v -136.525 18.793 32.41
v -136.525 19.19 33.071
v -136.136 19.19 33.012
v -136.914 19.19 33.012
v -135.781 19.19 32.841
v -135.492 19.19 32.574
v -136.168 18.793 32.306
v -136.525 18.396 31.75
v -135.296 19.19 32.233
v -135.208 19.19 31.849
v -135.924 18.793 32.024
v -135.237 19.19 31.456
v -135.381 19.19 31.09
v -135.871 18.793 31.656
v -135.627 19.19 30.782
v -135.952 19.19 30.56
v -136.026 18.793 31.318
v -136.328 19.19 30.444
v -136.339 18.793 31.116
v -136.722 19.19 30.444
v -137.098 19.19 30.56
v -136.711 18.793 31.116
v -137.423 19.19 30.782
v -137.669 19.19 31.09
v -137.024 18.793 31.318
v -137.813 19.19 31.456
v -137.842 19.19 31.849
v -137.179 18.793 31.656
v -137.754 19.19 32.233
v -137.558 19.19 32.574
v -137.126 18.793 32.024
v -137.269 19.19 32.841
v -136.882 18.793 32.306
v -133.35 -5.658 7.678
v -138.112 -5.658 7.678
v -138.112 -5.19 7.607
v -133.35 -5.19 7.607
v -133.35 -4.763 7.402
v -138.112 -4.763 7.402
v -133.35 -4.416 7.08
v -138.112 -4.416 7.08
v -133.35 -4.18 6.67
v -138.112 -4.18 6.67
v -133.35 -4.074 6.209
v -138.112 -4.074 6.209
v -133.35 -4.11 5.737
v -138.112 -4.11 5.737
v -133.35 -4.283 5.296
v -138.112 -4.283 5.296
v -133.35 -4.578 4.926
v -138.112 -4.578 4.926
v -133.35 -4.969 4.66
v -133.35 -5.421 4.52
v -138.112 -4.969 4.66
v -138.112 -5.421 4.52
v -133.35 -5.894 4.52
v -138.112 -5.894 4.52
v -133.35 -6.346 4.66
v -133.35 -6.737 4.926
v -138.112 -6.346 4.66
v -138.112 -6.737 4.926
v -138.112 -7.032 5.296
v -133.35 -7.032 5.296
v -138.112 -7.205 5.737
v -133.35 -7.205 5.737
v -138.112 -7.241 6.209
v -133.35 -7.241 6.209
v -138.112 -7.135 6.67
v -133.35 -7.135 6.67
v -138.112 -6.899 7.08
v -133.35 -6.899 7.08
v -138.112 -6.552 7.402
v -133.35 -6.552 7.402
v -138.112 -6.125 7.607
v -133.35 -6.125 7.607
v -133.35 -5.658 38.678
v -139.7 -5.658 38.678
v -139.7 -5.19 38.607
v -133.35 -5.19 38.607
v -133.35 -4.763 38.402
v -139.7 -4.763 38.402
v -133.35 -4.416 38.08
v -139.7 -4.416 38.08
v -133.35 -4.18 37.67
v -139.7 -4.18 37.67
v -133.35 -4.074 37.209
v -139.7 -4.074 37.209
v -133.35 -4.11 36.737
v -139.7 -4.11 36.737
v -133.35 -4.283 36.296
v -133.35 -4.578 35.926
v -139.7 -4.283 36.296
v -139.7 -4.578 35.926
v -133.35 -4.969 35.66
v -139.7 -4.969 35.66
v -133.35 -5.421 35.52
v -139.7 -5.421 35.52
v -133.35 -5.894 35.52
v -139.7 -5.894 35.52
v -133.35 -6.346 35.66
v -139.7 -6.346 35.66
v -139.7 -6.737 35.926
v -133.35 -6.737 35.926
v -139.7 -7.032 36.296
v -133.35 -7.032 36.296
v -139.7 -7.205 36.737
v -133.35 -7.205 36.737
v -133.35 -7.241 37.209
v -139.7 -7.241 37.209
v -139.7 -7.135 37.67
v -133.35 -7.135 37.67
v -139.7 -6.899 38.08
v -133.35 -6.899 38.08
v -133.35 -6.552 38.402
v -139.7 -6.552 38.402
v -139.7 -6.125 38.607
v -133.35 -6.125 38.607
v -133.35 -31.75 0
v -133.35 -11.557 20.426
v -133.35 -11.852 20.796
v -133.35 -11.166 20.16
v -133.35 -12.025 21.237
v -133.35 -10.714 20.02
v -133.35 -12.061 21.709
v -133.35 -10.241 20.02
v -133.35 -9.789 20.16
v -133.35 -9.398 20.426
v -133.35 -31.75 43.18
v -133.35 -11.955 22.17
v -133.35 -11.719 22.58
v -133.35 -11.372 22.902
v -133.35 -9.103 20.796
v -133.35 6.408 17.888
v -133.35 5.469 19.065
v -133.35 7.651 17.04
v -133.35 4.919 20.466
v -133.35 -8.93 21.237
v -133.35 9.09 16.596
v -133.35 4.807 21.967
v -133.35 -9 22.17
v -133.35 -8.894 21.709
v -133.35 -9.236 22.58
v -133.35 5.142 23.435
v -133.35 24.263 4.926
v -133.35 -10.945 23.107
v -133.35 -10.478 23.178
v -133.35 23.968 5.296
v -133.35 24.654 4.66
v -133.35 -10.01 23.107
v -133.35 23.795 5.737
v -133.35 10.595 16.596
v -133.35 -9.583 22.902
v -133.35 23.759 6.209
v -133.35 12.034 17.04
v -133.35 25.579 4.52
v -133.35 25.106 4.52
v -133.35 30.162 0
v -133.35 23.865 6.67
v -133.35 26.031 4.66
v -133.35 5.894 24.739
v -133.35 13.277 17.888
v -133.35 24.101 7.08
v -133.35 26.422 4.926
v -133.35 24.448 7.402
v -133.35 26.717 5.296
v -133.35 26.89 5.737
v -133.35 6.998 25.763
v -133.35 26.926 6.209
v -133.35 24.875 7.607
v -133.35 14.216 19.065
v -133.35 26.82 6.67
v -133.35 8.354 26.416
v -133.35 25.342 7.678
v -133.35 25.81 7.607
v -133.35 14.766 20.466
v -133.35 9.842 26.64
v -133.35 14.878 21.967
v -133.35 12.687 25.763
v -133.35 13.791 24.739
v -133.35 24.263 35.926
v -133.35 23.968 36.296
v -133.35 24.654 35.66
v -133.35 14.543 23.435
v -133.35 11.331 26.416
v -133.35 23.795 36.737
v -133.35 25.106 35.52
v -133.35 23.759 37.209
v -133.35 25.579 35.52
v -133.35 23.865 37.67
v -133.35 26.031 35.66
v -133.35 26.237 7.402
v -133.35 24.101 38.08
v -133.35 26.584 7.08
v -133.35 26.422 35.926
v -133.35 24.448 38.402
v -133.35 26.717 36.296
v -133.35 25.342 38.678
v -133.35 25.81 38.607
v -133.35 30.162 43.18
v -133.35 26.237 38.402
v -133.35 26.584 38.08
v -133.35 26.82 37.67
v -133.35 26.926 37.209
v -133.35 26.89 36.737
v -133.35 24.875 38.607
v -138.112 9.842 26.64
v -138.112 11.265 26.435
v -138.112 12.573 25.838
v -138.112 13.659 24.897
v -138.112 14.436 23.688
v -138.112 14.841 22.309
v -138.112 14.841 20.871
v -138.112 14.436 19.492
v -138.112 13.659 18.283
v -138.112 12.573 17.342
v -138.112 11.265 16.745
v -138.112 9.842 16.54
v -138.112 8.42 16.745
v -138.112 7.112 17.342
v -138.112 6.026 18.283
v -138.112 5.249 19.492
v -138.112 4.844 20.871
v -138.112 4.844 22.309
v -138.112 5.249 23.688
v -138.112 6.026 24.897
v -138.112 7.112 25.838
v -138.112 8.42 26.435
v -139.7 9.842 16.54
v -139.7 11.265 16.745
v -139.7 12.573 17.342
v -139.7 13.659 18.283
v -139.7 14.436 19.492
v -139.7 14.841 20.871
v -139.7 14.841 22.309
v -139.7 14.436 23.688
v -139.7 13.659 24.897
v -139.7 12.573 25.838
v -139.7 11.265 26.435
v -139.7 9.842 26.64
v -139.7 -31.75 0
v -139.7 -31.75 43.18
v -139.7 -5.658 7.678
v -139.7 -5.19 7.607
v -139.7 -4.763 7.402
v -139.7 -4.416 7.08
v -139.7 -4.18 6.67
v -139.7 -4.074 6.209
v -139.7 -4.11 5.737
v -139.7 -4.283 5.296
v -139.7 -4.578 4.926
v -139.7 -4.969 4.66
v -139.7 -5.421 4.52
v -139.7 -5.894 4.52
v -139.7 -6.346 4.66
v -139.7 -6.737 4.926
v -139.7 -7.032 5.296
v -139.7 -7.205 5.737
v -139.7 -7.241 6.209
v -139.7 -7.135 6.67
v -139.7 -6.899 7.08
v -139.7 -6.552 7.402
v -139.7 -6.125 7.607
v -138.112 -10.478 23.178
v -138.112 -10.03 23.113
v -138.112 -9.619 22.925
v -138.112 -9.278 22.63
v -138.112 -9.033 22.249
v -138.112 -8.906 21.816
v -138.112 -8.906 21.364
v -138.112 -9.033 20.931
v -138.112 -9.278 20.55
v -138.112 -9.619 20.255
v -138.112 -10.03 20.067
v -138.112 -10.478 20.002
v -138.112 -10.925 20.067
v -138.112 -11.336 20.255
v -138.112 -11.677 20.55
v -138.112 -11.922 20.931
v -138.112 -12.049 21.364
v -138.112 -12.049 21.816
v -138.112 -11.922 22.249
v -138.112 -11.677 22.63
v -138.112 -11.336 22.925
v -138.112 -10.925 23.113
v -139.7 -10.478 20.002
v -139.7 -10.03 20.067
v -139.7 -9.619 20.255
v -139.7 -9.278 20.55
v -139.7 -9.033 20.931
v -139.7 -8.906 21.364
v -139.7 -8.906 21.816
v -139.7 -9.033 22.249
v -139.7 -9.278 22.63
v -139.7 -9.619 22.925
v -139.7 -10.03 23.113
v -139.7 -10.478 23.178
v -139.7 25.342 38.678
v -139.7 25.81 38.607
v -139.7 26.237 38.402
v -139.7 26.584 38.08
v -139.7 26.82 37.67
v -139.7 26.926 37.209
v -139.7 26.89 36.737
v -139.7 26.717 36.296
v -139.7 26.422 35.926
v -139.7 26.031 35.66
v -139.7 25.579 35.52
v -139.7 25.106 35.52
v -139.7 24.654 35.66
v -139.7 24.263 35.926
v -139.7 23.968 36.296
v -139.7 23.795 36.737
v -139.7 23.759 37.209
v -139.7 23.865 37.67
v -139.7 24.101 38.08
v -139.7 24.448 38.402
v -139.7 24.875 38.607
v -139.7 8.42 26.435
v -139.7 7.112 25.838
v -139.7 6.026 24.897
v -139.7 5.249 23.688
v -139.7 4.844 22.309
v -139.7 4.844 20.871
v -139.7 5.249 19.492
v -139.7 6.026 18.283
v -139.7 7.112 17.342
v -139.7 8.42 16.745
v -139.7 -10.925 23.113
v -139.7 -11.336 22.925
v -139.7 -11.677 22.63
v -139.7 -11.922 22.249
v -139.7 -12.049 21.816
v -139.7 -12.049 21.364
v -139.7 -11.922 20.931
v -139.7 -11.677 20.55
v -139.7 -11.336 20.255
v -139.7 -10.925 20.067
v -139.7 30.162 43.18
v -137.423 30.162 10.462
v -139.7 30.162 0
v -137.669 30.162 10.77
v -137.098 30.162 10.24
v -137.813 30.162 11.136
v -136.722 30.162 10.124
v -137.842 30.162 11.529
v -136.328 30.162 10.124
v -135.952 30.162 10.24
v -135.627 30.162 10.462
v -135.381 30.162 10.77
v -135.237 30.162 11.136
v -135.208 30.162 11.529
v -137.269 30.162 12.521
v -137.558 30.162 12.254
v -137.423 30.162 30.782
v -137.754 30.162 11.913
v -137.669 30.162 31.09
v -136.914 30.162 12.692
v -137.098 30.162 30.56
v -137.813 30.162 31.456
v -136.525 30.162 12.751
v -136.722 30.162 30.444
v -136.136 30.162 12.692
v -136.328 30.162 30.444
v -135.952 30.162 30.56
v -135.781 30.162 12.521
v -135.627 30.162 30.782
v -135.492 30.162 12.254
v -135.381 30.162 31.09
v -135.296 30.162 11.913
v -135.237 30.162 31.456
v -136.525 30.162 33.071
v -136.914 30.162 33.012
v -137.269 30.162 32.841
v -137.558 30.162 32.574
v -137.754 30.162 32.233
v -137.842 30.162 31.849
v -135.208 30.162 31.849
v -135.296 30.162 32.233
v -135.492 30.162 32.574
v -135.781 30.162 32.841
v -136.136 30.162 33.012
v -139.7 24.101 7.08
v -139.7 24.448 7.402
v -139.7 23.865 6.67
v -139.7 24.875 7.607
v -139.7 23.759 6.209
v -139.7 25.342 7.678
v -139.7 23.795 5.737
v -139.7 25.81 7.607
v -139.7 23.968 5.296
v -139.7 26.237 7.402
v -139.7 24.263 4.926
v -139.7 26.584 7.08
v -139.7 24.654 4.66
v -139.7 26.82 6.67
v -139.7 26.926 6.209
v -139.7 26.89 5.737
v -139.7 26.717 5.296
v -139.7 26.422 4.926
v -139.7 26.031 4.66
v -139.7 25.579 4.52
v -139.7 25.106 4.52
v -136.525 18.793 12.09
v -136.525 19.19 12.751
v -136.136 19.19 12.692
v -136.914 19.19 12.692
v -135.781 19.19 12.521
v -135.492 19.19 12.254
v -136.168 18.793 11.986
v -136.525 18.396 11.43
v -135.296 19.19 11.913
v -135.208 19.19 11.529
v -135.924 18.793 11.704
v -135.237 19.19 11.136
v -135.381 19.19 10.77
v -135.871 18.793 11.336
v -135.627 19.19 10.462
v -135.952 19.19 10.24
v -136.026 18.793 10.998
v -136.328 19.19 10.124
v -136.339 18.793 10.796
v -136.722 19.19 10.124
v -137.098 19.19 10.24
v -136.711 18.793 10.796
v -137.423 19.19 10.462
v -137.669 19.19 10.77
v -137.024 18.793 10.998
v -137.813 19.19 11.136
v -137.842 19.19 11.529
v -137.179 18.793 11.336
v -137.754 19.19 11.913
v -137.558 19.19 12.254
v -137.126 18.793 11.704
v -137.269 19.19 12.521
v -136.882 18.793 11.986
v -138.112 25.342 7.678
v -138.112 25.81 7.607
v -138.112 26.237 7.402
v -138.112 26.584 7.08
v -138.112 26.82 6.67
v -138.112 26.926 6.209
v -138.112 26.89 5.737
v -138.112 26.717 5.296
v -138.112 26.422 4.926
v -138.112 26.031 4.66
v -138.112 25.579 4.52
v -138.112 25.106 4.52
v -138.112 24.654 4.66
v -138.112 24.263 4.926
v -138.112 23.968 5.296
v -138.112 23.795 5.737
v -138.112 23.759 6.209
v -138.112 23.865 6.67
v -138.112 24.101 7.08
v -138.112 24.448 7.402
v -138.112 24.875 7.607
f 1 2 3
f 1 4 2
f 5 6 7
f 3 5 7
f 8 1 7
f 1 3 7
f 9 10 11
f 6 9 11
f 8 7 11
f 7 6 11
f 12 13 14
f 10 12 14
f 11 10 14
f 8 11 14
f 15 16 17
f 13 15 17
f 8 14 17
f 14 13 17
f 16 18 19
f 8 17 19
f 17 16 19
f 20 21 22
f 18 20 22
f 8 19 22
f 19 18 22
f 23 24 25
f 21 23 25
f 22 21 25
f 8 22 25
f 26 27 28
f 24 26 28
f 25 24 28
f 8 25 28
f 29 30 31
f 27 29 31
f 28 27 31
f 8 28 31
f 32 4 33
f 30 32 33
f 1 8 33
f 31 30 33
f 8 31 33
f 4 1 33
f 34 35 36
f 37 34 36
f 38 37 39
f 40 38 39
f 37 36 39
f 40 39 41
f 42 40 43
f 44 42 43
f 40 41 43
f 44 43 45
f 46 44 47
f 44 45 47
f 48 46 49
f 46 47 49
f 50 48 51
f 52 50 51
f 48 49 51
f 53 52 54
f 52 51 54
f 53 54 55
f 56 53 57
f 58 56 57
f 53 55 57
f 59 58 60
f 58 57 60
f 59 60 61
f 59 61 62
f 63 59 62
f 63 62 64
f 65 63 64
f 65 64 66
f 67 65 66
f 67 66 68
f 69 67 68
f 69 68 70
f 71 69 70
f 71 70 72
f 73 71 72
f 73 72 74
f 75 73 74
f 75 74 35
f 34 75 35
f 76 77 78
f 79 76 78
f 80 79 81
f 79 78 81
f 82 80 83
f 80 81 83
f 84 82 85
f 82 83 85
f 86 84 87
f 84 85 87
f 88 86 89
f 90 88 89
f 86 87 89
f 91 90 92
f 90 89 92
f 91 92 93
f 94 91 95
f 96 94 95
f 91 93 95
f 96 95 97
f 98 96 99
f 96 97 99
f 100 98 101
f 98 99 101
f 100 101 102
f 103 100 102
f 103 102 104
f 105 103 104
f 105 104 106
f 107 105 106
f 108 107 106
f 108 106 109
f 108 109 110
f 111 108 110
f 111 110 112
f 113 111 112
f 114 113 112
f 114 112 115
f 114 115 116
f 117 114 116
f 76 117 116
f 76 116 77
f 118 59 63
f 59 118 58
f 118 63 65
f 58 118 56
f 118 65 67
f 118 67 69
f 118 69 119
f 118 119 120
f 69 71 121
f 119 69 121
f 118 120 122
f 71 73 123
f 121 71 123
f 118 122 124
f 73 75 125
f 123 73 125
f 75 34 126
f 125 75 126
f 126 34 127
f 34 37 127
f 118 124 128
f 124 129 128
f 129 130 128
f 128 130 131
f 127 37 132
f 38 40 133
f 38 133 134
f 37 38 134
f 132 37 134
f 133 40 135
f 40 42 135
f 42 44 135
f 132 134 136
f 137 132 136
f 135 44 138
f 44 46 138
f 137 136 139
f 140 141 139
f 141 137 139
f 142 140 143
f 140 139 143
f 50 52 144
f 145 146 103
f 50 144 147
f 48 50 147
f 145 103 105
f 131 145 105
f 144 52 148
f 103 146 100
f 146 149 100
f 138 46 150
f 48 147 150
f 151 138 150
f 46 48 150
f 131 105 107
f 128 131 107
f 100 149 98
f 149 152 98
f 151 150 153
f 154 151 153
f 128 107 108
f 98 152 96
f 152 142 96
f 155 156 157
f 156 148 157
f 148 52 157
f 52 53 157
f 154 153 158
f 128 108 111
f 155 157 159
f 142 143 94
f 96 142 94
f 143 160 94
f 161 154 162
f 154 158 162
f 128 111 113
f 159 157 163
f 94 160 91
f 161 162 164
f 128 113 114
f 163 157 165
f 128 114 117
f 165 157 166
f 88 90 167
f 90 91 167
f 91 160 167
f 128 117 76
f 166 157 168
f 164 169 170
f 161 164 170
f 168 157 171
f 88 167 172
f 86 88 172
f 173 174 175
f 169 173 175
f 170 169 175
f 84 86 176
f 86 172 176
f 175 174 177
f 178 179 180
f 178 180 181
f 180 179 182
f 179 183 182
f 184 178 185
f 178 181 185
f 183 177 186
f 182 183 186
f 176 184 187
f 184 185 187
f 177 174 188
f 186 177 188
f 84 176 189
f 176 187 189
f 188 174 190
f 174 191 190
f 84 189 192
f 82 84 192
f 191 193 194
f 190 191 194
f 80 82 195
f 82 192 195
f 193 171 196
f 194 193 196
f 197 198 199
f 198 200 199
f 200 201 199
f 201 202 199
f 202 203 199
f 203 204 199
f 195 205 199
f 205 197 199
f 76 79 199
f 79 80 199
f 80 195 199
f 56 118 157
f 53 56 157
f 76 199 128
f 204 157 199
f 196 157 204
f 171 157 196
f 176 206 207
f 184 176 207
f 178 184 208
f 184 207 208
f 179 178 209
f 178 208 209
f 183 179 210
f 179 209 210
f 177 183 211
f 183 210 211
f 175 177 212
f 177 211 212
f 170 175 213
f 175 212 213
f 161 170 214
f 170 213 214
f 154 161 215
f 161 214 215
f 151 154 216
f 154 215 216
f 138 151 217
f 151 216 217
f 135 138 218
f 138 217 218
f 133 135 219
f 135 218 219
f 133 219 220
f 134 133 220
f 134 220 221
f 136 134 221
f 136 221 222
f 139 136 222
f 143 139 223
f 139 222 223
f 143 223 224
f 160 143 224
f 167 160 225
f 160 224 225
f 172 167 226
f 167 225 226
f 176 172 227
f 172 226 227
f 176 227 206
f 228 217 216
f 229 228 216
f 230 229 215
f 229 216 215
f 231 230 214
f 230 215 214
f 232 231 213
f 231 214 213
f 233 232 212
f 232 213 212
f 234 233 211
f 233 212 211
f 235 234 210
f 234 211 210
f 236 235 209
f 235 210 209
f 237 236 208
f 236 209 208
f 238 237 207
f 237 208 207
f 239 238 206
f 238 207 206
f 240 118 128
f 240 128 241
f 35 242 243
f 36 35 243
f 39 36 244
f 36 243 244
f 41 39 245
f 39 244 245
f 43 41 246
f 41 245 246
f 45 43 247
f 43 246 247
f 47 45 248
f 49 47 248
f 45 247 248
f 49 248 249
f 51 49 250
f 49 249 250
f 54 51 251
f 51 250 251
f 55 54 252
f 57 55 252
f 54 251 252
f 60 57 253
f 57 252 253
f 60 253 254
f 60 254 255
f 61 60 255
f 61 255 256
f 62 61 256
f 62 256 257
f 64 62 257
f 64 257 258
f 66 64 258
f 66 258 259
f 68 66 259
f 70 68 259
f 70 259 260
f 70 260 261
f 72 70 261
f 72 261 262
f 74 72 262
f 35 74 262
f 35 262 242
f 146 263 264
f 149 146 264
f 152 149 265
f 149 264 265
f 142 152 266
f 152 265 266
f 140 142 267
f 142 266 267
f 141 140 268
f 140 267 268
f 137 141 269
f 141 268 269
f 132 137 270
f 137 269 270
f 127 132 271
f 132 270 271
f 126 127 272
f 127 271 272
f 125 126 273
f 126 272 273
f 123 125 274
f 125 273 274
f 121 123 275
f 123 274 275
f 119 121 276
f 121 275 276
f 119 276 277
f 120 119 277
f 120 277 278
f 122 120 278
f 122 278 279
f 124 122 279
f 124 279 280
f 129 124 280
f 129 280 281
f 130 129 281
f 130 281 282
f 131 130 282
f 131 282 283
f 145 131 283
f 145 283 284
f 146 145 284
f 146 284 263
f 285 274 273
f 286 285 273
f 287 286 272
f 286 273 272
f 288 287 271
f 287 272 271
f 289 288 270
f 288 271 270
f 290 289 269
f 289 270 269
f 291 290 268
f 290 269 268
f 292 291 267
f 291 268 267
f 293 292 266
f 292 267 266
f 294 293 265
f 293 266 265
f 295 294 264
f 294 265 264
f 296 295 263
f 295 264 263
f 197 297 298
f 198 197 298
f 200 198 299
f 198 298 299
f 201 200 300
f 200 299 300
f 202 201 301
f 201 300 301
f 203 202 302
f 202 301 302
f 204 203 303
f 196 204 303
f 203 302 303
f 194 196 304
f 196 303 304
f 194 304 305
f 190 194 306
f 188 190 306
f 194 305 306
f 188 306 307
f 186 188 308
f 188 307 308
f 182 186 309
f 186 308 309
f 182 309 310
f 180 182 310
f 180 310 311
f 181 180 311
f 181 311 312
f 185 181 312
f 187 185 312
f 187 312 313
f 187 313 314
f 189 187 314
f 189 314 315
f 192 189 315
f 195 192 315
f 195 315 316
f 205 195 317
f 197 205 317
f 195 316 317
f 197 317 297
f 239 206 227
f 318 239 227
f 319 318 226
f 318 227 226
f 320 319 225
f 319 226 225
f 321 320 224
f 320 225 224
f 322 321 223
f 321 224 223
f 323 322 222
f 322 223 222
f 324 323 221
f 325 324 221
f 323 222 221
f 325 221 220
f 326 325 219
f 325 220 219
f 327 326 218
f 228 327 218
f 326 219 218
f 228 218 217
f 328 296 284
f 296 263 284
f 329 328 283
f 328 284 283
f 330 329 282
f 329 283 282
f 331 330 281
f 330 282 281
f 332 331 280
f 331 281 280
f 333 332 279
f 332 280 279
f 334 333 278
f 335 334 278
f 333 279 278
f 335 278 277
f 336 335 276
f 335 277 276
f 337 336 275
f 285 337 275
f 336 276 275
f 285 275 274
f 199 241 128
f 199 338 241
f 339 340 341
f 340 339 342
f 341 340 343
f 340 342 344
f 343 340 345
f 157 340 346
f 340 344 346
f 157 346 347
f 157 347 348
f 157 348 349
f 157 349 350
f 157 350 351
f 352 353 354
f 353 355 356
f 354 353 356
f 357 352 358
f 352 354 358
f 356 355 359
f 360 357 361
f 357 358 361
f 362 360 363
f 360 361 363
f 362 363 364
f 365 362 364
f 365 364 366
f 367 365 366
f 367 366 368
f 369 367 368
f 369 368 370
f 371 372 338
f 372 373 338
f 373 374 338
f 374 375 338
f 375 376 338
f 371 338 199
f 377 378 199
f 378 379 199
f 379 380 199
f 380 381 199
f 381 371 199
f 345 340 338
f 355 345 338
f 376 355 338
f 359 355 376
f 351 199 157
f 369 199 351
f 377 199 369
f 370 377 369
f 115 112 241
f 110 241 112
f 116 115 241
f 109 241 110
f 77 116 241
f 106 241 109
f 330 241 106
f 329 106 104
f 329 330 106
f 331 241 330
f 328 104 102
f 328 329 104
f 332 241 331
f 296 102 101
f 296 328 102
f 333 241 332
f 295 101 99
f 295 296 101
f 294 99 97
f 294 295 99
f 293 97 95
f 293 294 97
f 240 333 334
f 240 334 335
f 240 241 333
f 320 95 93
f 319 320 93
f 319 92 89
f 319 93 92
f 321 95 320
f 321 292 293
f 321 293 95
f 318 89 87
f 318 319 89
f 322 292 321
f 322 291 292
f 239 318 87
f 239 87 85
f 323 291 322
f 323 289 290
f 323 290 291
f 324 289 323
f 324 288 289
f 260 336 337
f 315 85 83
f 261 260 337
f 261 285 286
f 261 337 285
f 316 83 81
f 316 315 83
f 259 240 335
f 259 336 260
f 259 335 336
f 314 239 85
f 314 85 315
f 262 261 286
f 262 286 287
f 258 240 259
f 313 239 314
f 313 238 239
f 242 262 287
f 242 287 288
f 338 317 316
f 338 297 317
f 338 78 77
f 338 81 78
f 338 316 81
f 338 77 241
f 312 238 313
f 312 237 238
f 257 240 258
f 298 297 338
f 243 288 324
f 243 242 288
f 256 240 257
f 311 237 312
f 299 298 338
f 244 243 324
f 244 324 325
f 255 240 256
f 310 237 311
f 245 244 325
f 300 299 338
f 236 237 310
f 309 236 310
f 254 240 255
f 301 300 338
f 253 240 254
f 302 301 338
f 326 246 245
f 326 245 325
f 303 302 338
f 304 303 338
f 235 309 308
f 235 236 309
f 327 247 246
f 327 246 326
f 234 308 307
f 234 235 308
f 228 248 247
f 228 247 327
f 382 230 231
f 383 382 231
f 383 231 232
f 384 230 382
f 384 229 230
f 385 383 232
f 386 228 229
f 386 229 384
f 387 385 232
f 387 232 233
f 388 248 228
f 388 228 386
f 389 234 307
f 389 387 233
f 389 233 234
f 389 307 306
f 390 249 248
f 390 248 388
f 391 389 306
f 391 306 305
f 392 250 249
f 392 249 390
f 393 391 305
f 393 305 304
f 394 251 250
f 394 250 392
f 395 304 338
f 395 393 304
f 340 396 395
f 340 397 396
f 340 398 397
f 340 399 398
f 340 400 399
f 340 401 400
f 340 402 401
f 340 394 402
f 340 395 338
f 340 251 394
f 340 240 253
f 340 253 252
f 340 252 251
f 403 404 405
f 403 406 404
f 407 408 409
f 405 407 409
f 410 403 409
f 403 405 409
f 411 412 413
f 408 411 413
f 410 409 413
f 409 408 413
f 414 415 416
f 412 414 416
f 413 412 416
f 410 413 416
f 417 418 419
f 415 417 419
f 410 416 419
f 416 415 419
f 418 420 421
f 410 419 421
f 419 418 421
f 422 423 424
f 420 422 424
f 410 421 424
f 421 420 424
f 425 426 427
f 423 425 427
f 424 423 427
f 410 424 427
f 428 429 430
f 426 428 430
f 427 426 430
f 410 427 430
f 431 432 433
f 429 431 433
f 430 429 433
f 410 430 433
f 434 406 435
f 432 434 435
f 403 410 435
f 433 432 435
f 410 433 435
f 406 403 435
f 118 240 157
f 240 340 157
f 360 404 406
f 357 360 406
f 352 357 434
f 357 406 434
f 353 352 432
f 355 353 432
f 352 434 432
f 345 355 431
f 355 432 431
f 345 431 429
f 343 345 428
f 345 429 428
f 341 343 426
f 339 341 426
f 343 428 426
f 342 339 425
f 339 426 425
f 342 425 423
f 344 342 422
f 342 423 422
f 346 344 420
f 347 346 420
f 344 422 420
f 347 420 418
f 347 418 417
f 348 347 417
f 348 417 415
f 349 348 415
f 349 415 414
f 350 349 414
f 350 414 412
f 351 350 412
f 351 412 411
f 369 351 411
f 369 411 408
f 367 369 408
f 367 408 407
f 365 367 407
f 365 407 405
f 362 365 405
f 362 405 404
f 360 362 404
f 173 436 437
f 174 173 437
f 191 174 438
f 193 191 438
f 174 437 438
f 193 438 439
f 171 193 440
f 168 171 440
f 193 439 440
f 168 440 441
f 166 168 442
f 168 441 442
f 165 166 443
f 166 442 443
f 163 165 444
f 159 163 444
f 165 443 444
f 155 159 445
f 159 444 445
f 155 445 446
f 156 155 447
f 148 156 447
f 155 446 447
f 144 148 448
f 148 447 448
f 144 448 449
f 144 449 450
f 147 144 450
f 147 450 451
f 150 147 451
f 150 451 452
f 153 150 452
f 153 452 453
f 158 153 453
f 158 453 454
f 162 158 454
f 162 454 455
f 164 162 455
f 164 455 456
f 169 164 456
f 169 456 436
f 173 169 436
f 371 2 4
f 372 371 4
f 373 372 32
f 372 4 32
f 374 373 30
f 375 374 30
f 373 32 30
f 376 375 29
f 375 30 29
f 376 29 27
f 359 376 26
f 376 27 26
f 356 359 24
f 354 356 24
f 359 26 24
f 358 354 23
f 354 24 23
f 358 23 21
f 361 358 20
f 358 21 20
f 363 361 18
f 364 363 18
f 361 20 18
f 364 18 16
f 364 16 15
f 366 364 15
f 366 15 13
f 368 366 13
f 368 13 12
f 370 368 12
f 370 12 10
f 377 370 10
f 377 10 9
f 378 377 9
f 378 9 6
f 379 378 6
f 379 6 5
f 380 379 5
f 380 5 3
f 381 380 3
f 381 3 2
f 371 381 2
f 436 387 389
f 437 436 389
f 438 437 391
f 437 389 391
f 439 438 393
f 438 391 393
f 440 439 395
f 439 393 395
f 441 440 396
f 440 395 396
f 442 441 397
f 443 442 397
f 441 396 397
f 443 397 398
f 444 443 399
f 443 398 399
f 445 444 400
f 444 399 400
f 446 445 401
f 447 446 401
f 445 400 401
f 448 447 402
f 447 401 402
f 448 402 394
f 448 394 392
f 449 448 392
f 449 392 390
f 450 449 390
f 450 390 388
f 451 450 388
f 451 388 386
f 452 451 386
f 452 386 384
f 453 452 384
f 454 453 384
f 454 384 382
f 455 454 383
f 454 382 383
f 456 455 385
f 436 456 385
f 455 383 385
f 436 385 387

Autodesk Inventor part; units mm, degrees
ref_plane "YZ Plane" through (0, 0, 0) normal (1, 0, 0) x (0, 1, 0)
ref_plane "XZ Plane" through (0, 0, 0) normal (0, 1, 0) x (-1, 0, 0)
ref_plane "XY Plane" through (0, 0, 0) normal (0, 0, 1) x (1, 0, 0)
sketch "Sketch1" plane through (0, 0, 0) normal (0, 0, 1) x (1, 0, 0)
  line L0 (-139.7, 31.75) -> (139.7, 31.75)
  line L1 (139.7, 31.75) -> (139.7, -31.75)
  line L2 (139.7, -31.75) -> (-139.7, -31.75)
  line L3 (-139.7, -31.75) -> (-139.7, 31.75)
  point P0 (0, 0)
  point P1 (0, 31.75)
  point P2 (139.7, 0)
  dimension "d0" = 279.4
  dimension "d1" = 63.5
extrude "Extrusion1" add sketch "Sketch1" along normal blind 43.18
sketch "Sketch2" plane through (0, 0, 43.18) normal (0, 0, 1) x (1, 0, 0)
  line L0 (-139.7, -31.75) -> (139.7, -31.75) projected
  line L1 (-138.1125, 30.1625) -> (138.1125, 30.1625)
  line L2 (138.1125, 30.1625) -> (138.1125, -31.75)
  line L3 (138.1125, -31.75) -> (-138.1125, -31.75)
  line L4 (-138.1125, -31.75) -> (-138.1125, 30.1625)
  line L5 (139.7, -31.75) -> (139.7, 31.75) projected
  line L6 (139.7, 31.75) -> (-139.7, 31.75) projected
  line L7 (-139.7, 31.75) -> (-139.7, -31.75) projected
  point P0 (0, 0)
  point P1 (-138.1125, -31.75)
  dimension "d4" = 1.5875
  dimension "d5" = 1.5875
  dimension "d6" = 1.5875
extrude "Extrusion2" cut sketch "Sketch2" against normal up to surface (43.18 mm away) contours L4 L1 L2 L0
sketch "Sketch3" plane through (-138.1125, -31.75, 43.18) normal (1, 0, 0) x (0, 0, -1)
  circle A0 centre (21.59, 41.5925) radius 5.05
  line L0 (0, 61.9125) -> (43.18, 61.9125) projected
  circle A1 centre (21.59, 21.2725) radius 1.5875
  line L1 (43.18, 63.5) -> (0, 63.5) projected
  point P0 (43.18, 31.75)
  point P1 (21.59, 63.5)
  dimension "d9" = 10.1
  dimension "d10" = 20.32
  dimension "d13" = 3.175
  dimension "d15" = 20.32
extrude "Extrusion3" cut sketch "Sketch3" along normal through all both and the other way through all
sketch "Sketch4" plane through (139.7, -31.75, 0) normal (1, 0, 0) x (0, 0, -1)
  circle A0 centre (-10.16, 26.3525) radius 2.3813
  line L0 (0, 63.5) -> (-43.18, 63.5) construction
  line L1 (-21.59, 63.5) -> (-21.59, -3.1611) construction
  line L2 (0, 0) -> (0, 63.5) projected
  circle A1 centre (-21.59, 41.5925) radius 5.05 projected
  circle A2 centre (-33.02, 26.3525) radius 2.3813
  point P0 (0, 31.75)
  dimension "d16" = 10.16
  dimension "d17" = 15.24
  dimension "d18" = 4.7625
extrude "Extrusion4" cut sketch "Sketch4" against normal up to surface (1.5875 mm away) contours A0 | A2
sketch "Sketch5" plane through (-139.7, -31.75, 0) normal (-1, 0, 0) x (0, 0, 1)
  circle A0 centre (21.59, 41.5925) radius 5.05 construction
  line L0 (21.59, 41.5925) -> (21.59, 66.4825) construction
  line L1 (21.59, 41.5925) -> (51.2225, 41.5925) construction
  circle A1 centre (37.09, 57.0925) radius 1.5875
  circle A2 centre (6.09, 57.0925) radius 1.5875
  circle A3 centre (37.09, 26.0925) radius 1.5875
  circle A4 centre (6.09, 26.0925) radius 1.5875
  point P0 (0, 31.75)
  dimension "d21" = 3.175
  dimension "d22" = 15.5
  dimension "d23" = 15.5
extrude "Extrusion5" cut sketch "Sketch5" against normal up to surface (1.5875 mm away)
sketch "Sketch6" plane through (0, 0, 43.18) normal (0, 0, 1) x (1, 0, 0)
  line L0 (-138.1125, 30.1625) -> (138.1125, 30.1625) projected
  line L1 (-138.1125, 30.1625) -> (155.4569, 30.1625)
  line L2 (155.4569, 30.1625) -> (155.4569, 53.3555)
  line L3 (155.4569, 53.3555) -> (-138.1125, 53.3555)
  line L4 (-138.1125, 53.3555) -> (-138.1125, 30.1625)
  line L5 (155.4569, 53.3555) -> (81.9347, 53.3555)
  line L6 (81.9347, 53.3555) -> (81.9347, -39.2964)
  line L7 (81.9347, -39.2964) -> (155.4569, -39.2964)
  line L8 (155.4569, -39.2964) -> (155.4569, 53.3555)
  line L9 (-138.1125, 30.1625) -> (-141.389, 30.1625)
  line L10 (-141.389, 30.1625) -> (-141.389, 34.0033)
  line L11 (-141.389, 34.0033) -> (-138.1125, 34.0033)
  line L12 (-138.1125, 34.0033) -> (-138.1125, 30.1625)
  point P0 (0, 0)
  point P1 (81.9347, 30.1625)
extrude "Extrusion6" cut sketch "Sketch6" against normal through all
sketch "Sketch7" plane through (-139.7, -31.75, 0) normal (-1, 0, 0) x (0, 0, 1)
  line L0 (43.18, 61.9125) -> (0, 61.9125) projected
  line L1 (0, 61.9125) -> (0, 0) projected
  line L2 (0, 0) -> (43.18, 0) projected
  line L3 (43.18, 61.9125) -> (43.18, 0) projected
  circle A0 centre (37.09, 26.0925) radius 1.5875 projected
  circle A1 centre (6.09, 57.0925) radius 1.5875 projected
  circle A2 centre (6.09, 26.0925) radius 1.5875 projected
  circle A3 centre (37.09, 57.0925) radius 1.5875 projected
  circle A4 centre (21.59, 41.5925) radius 5.05 projected
  circle A5 centre (21.59, 21.2725) radius 1.5875 projected
  point P0 (0, 31.75)
extrude "Extrusion7" add sketch "Sketch7" against normal blind 6.35
sketch "Sketch8" plane through (-139.7, 30.1625, 43.18) normal (0, 1, 0) x (1, 0, 0)
  line L0 (0, 0) -> (6.35, 0) projected
  line L1 (3.175, 0) -> (3.175, 11.43)
  line L2 (0, 43.18) -> (6.35, 43.18) projected
  line L3 (3.175, 43.18) -> (3.175, 31.75)
  point P0 (139.7, 43.18)
  dimension "d30" = 11.43
  dimension "d31" = 11.43
hole "Hole1" at (-136.525, 30.1625, 31.75) at (-136.525, 30.1625, 11.43) direction (0, -1, 0) diameter 2.6416 depth 10.9728 tip angle 118 thread size "6-32 UNC" class "2B" standard "ANSI Unified Screw Threads"
properties part number "Bracket(left)"
